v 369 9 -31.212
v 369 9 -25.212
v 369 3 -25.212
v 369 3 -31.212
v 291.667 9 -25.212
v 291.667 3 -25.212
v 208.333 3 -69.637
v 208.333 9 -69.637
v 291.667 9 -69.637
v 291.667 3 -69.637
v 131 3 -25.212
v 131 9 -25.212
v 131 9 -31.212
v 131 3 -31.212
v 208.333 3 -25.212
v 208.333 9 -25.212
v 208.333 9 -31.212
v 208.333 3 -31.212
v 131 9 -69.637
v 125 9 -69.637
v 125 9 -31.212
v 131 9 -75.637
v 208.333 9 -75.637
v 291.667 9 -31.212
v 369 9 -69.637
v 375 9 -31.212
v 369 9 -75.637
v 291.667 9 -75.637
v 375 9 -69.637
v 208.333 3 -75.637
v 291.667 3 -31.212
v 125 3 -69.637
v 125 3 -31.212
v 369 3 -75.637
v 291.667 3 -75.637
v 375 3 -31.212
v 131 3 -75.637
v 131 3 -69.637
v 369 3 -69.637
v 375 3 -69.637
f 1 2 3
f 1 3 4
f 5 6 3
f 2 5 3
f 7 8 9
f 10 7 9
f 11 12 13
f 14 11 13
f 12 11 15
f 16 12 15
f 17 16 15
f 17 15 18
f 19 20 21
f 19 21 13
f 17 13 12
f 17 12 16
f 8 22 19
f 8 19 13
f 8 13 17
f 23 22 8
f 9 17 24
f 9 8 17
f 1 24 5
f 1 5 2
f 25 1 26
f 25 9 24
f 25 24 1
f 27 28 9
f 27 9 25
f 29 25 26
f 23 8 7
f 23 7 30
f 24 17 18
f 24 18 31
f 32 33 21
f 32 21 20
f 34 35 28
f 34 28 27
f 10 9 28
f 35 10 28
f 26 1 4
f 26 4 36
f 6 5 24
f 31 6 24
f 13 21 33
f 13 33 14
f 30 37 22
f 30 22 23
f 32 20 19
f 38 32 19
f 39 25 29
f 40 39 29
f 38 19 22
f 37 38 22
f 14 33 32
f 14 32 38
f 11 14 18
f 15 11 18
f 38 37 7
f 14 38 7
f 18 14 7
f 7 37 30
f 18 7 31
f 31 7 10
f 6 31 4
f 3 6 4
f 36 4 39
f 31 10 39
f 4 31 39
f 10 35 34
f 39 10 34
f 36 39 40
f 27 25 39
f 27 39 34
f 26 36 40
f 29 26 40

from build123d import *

# Parameters (mm, degrees)
SKETCH2_W           = 500
SKETCH2_H           = 100.85
BOSS_EXTRUDE1_DEPTH = 12
SKETCH4_W           = 12
SKETCH4_H           = 12
CUT_EXTRUDE2_DEPTH  = 511.210468826
SKETCH5_W           = 166.666666666
SKETCH5_H           = 12
CUT_EXTRUDE3_DEPTH  = 511.210468826
SCALE1_SCALE        = 0.5


with BuildPart() as part:
    # Sketch2 → Boss-Extrude1 (new body)
    with BuildSketch(Plane(origin=(0, 0, 0), x_dir=(1, 0, 0), z_dir=(0, 1, 0))):
        with Locations((250, 50.425)):
            Rectangle(SKETCH2_W, SKETCH2_H)
    extrude(amount=BOSS_EXTRUDE1_DEPTH)

    # Sketch4 → Cut-Extrude2 (cut, through all)
    with BuildSketch(Plane(origin=(0, 12, 0), x_dir=(1, 0, 0), z_dir=(0, 1, 0))):
        with Locations((494, 6)):
            Rectangle(SKETCH4_W, SKETCH4_H)
        with Locations((494, 94.85)):
            Rectangle(SKETCH4_W, SKETCH4_H)
        with Locations((6, 94.85)):
            Rectangle(SKETCH4_W, SKETCH4_H)
        with Locations((6, 6)):
            Rectangle(SKETCH4_W, SKETCH4_H)
    extrude(amount=-CUT_EXTRUDE2_DEPTH, mode=Mode.SUBTRACT)

    # Sketch5 → Cut-Extrude3 (cut, through all)
    with BuildSketch(Plane(origin=(0, 12, 0), x_dir=(1, 0, 0), z_dir=(0, 1, 0))):
        with Locations((250, 94.85)):
            Rectangle(SKETCH5_W, SKETCH5_H)
        with Locations((250, 6)):
            Rectangle(SKETCH5_W, SKETCH5_H)
    extrude(amount=-CUT_EXTRUDE3_DEPTH, mode=Mode.SUBTRACT)


with BuildPart() as part_1:
    # Scale1: scaled about (250, 6, -50.425)
    add(part.part.scale(SCALE1_SCALE).moved(Location((125, 3, -25.2125))))


solid = part_1.part
